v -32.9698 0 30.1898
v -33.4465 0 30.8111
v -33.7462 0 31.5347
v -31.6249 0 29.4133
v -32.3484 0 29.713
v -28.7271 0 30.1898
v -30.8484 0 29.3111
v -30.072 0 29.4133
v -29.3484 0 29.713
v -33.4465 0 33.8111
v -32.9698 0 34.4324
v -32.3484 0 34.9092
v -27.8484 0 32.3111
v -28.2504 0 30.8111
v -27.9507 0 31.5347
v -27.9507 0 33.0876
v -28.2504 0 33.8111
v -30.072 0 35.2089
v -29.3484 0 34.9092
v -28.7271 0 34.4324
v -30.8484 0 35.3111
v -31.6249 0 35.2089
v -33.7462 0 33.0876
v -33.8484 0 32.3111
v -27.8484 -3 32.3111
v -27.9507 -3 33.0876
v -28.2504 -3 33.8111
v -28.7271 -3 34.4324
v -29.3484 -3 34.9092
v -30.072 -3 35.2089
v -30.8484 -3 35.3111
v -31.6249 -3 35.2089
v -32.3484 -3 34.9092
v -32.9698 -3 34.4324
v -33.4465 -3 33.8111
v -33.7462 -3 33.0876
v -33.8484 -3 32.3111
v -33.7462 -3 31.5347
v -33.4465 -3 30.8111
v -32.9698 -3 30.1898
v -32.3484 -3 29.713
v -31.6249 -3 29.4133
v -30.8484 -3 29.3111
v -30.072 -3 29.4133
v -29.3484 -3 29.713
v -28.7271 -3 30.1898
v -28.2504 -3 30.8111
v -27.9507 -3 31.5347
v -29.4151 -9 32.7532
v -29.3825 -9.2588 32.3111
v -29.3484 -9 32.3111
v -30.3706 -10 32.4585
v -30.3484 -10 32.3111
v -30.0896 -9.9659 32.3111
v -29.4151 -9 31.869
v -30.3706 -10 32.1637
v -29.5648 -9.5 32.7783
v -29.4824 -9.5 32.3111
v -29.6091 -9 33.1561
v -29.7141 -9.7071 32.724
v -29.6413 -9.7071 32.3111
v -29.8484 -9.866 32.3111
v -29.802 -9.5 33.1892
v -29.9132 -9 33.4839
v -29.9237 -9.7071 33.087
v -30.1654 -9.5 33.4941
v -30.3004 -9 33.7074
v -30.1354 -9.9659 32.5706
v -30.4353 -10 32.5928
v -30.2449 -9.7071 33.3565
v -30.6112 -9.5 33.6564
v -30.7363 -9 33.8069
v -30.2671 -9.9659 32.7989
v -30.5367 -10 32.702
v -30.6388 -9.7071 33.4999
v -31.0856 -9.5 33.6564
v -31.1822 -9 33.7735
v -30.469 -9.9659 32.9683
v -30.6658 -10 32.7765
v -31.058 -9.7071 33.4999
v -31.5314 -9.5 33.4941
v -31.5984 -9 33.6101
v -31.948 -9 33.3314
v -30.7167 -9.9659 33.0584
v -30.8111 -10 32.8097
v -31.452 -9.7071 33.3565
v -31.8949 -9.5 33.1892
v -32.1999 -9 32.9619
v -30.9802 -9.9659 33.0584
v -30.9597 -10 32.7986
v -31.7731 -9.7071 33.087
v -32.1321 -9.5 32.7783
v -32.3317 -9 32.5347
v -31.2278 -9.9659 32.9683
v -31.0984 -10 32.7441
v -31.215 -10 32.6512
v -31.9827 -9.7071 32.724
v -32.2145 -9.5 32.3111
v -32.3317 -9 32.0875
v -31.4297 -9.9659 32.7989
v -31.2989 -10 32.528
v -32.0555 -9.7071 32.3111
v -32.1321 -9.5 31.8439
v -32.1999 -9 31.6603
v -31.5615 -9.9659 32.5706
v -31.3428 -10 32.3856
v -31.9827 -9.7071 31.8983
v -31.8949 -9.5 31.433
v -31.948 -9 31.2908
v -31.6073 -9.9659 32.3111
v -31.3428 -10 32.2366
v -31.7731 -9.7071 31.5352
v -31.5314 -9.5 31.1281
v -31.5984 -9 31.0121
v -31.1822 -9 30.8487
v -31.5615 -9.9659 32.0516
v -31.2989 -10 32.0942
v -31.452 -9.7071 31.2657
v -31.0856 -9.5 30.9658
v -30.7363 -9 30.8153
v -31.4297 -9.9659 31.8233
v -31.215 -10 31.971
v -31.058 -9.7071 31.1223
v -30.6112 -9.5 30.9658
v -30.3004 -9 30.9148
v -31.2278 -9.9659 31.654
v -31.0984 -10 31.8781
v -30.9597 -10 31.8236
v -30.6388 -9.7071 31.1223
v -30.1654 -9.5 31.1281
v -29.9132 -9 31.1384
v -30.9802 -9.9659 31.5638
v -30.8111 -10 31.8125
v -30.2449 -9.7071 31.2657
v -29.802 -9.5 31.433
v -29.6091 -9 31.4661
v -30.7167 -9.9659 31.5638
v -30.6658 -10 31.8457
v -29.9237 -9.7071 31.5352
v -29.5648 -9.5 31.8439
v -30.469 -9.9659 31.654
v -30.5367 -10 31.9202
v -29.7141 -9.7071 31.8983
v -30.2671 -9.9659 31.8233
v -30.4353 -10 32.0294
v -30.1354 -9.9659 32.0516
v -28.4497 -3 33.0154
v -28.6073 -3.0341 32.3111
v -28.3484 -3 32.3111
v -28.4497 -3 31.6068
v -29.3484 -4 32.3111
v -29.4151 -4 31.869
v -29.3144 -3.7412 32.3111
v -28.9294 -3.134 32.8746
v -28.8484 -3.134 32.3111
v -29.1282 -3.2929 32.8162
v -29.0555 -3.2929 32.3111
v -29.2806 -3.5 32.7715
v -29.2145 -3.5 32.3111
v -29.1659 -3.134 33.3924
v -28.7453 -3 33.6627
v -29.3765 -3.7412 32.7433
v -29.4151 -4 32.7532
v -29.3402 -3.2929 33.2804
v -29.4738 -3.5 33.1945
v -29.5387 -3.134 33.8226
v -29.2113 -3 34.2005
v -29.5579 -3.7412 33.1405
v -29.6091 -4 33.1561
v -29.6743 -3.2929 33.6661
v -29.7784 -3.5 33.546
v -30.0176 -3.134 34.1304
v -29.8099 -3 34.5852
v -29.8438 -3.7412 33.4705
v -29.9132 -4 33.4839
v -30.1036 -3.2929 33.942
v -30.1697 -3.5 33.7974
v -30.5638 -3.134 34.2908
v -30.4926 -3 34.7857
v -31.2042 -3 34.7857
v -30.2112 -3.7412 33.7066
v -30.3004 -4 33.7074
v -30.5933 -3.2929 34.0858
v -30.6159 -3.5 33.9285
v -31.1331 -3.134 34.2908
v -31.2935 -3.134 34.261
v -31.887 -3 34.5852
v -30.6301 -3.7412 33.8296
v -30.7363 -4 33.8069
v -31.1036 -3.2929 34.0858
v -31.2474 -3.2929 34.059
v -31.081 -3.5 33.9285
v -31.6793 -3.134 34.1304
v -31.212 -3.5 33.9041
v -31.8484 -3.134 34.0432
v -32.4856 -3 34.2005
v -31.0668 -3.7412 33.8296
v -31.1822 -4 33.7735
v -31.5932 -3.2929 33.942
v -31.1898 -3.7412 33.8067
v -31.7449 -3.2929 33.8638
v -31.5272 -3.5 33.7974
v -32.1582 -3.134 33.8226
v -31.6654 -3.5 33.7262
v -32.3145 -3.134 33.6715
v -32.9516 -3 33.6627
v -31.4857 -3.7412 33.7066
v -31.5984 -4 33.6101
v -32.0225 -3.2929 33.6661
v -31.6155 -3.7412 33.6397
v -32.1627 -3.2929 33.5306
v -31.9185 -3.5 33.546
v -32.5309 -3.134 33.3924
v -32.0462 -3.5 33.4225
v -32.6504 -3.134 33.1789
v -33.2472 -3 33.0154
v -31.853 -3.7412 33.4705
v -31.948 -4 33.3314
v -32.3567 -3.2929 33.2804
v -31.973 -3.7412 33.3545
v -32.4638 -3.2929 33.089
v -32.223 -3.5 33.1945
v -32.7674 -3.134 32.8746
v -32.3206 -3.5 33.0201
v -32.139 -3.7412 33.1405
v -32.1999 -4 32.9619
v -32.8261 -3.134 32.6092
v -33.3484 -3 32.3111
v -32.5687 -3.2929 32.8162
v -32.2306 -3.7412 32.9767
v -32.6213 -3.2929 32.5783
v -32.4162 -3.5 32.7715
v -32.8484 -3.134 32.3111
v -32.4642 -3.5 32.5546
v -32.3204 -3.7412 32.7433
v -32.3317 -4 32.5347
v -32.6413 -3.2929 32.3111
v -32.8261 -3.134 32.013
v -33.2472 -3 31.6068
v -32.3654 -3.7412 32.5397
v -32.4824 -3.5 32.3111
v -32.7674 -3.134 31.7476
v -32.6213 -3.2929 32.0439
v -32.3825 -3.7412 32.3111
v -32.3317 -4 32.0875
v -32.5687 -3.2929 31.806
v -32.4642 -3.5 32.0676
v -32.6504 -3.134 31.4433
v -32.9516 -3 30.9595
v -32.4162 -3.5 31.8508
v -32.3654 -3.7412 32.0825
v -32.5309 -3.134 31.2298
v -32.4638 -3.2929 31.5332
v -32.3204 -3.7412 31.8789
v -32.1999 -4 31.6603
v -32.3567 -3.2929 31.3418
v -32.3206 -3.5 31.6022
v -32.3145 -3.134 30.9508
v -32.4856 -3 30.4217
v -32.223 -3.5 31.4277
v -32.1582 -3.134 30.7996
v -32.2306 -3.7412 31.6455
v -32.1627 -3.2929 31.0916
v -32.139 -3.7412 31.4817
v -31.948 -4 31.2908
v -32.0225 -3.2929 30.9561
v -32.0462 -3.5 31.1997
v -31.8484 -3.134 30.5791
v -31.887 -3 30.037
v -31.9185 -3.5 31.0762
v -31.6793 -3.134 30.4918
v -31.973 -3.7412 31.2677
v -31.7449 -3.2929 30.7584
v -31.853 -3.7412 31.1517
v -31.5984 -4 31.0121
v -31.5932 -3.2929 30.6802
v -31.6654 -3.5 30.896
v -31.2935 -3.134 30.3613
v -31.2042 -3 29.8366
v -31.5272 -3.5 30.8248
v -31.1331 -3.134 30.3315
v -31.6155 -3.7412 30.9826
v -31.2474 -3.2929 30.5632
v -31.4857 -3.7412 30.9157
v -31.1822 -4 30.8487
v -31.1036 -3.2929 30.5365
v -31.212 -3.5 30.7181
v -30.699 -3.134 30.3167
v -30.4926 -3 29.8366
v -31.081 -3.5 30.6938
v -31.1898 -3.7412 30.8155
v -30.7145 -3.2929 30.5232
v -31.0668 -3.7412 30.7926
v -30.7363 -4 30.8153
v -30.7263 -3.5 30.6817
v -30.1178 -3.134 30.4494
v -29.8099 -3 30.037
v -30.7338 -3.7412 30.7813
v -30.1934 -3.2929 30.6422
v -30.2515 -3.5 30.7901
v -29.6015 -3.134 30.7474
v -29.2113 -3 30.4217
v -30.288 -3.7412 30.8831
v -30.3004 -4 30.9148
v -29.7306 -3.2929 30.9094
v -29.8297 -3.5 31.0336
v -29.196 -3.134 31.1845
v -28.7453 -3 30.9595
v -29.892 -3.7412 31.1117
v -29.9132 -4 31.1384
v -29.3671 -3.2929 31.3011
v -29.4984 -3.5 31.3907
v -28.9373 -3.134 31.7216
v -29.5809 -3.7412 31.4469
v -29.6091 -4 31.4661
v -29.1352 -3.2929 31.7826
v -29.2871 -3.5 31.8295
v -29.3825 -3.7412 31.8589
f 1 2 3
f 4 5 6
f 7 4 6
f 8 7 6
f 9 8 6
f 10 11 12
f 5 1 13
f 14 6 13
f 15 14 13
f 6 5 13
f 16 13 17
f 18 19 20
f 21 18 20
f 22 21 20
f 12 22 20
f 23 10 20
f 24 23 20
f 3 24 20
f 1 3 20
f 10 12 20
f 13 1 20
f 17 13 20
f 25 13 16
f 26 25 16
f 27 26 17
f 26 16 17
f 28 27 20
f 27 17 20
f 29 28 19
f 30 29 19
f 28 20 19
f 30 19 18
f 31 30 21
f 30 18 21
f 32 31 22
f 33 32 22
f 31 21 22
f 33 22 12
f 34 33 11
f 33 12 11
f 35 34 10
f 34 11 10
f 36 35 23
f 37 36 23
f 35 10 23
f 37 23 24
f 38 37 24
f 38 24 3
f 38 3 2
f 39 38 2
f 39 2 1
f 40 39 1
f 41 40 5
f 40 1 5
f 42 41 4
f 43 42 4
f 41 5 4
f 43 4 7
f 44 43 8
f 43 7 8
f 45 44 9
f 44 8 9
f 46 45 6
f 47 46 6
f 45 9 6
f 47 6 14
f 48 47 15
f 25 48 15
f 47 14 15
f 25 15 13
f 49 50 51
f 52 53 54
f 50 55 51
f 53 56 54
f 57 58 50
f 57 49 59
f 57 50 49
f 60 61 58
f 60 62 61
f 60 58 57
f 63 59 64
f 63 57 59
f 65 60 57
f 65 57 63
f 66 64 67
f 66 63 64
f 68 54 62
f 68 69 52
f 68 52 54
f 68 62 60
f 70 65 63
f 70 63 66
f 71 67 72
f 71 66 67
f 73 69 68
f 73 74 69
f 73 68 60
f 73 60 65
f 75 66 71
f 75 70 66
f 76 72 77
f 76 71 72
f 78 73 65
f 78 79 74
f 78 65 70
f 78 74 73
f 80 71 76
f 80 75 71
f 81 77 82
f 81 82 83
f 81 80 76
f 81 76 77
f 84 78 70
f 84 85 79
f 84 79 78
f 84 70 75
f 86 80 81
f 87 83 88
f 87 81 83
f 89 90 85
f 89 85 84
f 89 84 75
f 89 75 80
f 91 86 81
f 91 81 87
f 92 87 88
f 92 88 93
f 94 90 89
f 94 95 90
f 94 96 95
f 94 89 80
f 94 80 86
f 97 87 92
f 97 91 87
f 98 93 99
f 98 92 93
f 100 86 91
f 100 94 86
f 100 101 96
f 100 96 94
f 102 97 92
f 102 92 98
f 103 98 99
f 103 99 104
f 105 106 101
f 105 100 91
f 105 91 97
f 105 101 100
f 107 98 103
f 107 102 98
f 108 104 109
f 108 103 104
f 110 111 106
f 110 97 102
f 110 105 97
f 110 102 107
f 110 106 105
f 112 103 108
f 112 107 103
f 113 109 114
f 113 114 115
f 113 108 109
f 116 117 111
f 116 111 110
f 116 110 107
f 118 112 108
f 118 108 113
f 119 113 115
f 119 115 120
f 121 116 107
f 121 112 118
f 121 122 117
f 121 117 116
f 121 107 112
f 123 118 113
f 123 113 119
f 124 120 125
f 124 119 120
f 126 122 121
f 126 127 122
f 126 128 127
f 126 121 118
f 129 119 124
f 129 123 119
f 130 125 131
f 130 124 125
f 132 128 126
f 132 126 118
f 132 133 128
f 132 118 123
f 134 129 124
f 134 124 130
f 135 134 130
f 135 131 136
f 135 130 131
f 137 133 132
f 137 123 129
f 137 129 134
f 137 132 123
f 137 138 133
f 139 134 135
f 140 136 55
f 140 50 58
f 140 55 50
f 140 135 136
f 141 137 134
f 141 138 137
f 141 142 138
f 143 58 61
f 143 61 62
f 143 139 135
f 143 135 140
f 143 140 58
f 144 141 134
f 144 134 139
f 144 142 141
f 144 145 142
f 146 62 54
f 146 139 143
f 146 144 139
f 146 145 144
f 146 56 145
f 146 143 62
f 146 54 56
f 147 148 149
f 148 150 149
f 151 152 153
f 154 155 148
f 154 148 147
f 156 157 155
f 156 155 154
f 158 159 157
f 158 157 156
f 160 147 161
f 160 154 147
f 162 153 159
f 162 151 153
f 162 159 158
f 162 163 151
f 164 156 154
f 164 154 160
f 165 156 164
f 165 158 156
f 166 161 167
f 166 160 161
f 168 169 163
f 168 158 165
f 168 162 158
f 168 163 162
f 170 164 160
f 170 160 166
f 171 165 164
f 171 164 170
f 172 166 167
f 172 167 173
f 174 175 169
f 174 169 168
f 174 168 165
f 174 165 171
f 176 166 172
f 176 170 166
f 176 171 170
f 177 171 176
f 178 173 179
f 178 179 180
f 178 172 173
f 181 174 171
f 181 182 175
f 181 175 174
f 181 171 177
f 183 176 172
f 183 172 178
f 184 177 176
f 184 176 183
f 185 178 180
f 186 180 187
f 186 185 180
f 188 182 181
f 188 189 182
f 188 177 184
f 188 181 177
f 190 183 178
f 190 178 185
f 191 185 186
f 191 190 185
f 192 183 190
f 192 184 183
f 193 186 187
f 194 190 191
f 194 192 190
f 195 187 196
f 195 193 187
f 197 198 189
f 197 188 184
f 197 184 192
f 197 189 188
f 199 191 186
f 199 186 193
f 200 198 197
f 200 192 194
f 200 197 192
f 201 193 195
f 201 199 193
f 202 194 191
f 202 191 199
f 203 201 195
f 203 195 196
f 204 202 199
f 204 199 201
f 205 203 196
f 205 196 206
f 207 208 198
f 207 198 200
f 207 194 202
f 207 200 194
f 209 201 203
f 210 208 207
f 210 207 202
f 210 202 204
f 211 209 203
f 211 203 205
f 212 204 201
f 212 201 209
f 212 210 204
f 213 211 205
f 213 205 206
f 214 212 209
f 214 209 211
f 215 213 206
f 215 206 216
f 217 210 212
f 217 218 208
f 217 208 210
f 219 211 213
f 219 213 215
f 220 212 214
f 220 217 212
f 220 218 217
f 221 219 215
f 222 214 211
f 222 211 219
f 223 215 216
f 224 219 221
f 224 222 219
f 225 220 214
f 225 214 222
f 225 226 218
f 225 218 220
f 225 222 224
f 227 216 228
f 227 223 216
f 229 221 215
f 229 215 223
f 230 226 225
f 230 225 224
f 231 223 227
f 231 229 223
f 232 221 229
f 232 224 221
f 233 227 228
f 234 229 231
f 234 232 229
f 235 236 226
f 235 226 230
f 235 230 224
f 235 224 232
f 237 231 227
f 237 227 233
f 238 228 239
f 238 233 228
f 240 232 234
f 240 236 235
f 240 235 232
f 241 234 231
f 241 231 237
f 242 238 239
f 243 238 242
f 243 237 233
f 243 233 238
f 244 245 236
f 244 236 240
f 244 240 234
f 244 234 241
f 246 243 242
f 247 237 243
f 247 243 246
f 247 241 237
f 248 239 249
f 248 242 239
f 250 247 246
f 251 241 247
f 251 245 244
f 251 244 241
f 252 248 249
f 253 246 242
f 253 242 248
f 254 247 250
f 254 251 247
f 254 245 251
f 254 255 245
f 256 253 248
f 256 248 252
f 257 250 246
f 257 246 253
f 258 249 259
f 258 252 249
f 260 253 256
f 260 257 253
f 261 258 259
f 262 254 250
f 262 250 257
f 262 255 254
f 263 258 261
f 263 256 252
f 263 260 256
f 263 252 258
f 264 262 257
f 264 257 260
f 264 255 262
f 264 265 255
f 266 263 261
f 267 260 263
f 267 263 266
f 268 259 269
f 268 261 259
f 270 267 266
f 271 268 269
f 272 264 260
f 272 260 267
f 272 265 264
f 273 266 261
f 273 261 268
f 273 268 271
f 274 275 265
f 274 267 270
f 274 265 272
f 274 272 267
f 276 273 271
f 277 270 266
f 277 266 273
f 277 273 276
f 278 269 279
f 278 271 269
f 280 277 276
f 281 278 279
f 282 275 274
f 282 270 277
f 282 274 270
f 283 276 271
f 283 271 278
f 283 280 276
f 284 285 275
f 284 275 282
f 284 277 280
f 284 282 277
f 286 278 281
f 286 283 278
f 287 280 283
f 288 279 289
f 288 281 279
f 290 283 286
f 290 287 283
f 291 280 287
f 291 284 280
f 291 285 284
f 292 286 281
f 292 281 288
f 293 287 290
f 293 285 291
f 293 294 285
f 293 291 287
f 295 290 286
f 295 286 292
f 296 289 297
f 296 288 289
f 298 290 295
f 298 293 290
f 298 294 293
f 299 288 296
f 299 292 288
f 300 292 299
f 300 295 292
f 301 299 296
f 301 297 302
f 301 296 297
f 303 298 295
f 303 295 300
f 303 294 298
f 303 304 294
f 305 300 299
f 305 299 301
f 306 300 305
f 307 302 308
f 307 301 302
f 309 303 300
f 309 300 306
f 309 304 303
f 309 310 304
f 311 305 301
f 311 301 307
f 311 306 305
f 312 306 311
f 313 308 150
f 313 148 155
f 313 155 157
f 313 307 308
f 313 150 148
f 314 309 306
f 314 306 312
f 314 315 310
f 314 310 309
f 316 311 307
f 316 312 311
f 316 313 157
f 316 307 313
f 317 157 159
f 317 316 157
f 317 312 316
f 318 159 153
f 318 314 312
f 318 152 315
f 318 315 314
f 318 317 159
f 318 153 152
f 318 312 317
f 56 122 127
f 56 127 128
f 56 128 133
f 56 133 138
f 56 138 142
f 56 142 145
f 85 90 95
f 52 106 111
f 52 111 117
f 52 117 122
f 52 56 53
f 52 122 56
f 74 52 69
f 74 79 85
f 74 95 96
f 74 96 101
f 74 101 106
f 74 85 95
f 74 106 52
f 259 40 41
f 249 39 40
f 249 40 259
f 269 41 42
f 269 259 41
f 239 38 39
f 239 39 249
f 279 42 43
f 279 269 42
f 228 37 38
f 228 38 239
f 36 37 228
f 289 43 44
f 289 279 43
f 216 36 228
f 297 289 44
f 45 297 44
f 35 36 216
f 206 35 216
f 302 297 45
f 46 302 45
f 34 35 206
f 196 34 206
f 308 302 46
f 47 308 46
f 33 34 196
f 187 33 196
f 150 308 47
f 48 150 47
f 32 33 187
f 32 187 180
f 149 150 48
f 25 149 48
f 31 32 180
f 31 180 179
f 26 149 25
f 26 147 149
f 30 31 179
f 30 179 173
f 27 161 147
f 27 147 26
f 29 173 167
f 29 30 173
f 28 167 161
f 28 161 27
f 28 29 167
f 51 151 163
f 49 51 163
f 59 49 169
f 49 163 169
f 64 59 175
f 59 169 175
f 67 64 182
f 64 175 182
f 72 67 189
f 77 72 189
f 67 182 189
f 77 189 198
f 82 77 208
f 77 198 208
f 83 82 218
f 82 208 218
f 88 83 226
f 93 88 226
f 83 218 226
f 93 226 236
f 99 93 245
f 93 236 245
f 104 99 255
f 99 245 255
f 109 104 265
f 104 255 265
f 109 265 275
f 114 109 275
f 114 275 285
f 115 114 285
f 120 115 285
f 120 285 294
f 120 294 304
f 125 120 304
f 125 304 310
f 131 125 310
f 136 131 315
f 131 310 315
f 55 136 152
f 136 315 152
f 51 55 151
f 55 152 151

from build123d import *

# Parameters (mm, degrees)
SKETCH007_R  = 3
PAD003_DEPTH = 3
SKETCH008_R  = 1.5
PAD004_DEPTH = 7
FILLET_R     = 1
FILLET001_R  = 1


with BuildPart() as part:
    # Sketch007 → Pad003 (new body)
    with BuildSketch(Plane.XZ):
        with Locations((-30.848434, 32.311108)):
            Circle(SKETCH007_R)
    extrude(amount=PAD003_DEPTH)

    # Sketch008 → Pad004 (new body)
    with BuildSketch(Plane.XZ.offset(3)):
        with Locations((-30.848434, 32.311108)):
            Circle(SKETCH008_R)
    extrude(amount=PAD004_DEPTH)

    # Fillet
    fillet_edges = [part.edges().sort_by_distance(p)[0] for p in [
        (-32.348434, -3, 32.311108),
    ]]
    fillet(fillet_edges, radius=FILLET_R)

    # Fillet001
    fillet001_edges = [part.edges().sort_by_distance(p)[0] for p in [
        (-32.348434, -10, 32.311108),
    ]]
    fillet(fillet001_edges, radius=FILLET001_R)


solid = part.part
